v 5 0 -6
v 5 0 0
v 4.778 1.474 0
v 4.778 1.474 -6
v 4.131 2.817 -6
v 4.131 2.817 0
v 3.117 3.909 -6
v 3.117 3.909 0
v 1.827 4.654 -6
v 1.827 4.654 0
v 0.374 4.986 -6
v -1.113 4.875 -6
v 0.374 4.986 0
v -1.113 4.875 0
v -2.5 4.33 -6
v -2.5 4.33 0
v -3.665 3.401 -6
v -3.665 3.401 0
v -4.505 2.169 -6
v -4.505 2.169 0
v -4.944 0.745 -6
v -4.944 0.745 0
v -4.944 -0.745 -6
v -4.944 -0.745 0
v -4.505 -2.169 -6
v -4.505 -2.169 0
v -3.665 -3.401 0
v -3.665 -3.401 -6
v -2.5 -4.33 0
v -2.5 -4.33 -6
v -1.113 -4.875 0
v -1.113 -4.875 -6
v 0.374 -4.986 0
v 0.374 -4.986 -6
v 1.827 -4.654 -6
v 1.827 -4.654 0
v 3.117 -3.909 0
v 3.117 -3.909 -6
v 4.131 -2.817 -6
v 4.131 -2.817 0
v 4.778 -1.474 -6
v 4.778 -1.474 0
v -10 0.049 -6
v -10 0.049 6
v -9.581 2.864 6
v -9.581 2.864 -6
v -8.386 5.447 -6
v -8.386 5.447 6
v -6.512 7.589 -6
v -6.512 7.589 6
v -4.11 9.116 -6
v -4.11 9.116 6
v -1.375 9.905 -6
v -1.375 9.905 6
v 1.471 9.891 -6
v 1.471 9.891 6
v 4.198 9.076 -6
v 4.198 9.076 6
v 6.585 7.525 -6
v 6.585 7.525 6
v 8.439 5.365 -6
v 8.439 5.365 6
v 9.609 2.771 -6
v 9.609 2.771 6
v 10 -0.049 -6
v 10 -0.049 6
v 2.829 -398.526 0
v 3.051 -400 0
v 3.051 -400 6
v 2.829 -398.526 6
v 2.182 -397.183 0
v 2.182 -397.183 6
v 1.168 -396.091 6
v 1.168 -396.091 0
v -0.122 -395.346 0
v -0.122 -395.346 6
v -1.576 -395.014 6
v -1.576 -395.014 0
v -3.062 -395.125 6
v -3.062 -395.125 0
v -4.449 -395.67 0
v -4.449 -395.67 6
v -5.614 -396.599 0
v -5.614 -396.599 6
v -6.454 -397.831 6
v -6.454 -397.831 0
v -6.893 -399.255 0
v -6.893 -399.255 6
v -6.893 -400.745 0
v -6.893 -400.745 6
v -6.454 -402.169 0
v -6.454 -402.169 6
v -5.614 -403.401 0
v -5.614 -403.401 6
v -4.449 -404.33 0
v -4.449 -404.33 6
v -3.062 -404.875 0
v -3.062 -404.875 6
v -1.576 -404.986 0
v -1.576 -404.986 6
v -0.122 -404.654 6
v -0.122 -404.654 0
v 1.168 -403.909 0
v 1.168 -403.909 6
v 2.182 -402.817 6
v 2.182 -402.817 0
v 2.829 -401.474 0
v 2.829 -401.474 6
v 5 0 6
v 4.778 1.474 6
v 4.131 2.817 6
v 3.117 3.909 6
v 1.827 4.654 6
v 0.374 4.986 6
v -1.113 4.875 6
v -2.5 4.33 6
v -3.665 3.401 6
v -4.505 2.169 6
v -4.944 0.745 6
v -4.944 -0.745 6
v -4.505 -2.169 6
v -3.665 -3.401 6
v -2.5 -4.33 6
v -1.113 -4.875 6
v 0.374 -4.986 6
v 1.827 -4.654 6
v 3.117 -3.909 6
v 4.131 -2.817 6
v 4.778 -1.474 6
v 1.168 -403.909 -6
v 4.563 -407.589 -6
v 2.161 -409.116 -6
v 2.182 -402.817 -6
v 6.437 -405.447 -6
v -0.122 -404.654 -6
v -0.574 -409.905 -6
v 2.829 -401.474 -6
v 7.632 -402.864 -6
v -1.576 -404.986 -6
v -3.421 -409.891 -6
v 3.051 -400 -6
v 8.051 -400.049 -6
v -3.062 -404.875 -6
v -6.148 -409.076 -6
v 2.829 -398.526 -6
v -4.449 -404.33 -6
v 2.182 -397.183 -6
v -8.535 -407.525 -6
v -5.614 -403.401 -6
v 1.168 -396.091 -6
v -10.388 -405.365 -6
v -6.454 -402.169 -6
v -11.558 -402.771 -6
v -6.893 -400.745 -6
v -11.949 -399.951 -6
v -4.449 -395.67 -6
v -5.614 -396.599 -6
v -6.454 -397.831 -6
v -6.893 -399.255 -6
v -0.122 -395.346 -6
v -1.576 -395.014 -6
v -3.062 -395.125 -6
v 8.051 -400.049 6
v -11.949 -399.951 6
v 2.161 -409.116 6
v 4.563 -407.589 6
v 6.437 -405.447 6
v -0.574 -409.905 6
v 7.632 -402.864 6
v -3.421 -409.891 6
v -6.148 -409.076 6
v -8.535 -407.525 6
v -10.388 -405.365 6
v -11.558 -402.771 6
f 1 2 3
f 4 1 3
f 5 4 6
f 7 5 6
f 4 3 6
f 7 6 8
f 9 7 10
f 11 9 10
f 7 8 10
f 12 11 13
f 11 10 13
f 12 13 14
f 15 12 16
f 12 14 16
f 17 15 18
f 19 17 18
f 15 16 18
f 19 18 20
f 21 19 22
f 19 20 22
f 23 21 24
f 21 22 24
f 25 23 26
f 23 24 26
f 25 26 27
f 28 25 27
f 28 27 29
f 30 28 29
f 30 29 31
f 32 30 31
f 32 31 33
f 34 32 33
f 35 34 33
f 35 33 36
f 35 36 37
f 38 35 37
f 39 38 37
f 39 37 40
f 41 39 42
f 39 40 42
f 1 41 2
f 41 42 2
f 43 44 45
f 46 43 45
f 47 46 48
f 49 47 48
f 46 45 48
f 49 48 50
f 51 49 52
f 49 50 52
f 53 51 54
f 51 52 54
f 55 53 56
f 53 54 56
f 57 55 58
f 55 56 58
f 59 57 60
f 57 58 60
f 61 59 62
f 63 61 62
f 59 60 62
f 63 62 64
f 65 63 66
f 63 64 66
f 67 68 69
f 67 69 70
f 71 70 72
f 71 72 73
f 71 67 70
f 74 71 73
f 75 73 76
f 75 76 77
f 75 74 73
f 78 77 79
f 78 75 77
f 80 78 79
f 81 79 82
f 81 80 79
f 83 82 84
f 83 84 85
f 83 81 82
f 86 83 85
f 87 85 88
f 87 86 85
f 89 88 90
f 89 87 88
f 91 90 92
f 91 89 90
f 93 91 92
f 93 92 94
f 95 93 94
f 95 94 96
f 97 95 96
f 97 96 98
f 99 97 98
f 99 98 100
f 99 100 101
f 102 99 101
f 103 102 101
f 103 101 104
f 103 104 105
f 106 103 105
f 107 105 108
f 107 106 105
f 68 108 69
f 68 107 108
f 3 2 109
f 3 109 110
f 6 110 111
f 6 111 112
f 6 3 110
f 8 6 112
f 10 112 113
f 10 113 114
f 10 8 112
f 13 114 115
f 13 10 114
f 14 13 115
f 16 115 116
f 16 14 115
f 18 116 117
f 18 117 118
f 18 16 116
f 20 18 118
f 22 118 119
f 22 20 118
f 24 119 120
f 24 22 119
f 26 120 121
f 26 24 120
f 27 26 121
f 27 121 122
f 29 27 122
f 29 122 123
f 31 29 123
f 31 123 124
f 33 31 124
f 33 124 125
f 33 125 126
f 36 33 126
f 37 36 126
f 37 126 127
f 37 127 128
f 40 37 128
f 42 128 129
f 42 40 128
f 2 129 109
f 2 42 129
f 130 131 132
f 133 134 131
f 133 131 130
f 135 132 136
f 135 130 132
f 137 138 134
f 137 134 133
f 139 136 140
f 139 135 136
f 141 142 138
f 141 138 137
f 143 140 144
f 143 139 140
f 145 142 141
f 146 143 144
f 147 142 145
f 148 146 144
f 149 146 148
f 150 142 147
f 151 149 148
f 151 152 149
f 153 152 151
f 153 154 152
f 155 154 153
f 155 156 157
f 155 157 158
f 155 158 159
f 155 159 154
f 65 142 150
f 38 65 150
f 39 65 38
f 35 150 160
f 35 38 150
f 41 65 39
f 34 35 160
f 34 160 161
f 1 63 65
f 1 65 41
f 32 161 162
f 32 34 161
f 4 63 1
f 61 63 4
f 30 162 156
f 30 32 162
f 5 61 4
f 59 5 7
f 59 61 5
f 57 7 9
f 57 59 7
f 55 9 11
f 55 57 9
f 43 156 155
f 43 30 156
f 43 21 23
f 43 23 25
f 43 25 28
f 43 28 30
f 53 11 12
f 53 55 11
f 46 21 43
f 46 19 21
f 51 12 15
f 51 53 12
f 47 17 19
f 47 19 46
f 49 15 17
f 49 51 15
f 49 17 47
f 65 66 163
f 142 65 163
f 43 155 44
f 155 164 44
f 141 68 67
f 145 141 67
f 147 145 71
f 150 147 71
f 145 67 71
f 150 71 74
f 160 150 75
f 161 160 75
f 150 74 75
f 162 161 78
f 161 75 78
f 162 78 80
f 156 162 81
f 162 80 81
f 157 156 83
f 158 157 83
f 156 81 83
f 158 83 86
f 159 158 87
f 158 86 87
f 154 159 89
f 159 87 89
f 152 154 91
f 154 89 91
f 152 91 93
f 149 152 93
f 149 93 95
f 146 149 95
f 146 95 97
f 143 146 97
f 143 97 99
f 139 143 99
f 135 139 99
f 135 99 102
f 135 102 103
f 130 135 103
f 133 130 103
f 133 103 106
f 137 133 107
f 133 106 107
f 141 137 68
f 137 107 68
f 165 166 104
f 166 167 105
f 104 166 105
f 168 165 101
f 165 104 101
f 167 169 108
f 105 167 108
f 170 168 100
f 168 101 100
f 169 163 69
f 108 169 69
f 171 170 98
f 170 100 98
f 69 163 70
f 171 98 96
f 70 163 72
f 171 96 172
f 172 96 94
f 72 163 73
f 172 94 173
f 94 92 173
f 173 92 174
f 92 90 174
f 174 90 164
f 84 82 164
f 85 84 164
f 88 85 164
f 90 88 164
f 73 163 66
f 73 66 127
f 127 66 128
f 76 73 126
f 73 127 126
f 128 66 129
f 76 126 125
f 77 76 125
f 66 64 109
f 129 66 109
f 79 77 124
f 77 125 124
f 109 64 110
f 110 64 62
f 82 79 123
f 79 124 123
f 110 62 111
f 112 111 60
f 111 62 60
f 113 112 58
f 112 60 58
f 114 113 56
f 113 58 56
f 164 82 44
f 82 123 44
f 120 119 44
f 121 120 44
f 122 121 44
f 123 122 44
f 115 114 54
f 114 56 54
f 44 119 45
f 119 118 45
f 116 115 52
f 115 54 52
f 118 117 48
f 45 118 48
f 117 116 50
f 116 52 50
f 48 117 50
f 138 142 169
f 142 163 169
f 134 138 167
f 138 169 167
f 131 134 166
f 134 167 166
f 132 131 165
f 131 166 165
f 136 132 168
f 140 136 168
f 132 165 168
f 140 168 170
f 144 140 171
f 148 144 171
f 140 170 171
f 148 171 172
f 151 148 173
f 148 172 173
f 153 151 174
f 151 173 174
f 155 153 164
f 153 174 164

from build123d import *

# Parameters (mm, degrees)
SKETCH1_R           = 5
BOSS_EXTRUDE1_DEPTH = 6


with BuildPart() as part:
    # Sketch1 → Boss-Extrude1 (new body)
    with BuildSketch(Plane.XY):
        with BuildLine():
            Line((9.999881276, -0.048728438), (8.050720605, -400.048728438))
            ThreePointArc((8.050720605, -400.048728438), (-1.99788911, -409.999881276), (-11.949041948, -399.951271562))
            Line((-11.949041948, -399.951271562), (-9.999881276, 0.048728438))
            ThreePointArc((-9.999881276, 0.048728438), (0.048728438, 9.999881276), (9.999881276, -0.048728438))
        make_face()
        with Locations((-1.949160671, -400)):
            Circle(SKETCH1_R, mode=Mode.SUBTRACT)
        Circle(SKETCH1_R, mode=Mode.SUBTRACT)
    boss_extrude1 = extrude(amount=BOSS_EXTRUDE1_DEPTH)

    # Mirror1: Boss-Extrude1 across plane
    add(boss_extrude1.mirror(Plane.XY))


solid = part.part
